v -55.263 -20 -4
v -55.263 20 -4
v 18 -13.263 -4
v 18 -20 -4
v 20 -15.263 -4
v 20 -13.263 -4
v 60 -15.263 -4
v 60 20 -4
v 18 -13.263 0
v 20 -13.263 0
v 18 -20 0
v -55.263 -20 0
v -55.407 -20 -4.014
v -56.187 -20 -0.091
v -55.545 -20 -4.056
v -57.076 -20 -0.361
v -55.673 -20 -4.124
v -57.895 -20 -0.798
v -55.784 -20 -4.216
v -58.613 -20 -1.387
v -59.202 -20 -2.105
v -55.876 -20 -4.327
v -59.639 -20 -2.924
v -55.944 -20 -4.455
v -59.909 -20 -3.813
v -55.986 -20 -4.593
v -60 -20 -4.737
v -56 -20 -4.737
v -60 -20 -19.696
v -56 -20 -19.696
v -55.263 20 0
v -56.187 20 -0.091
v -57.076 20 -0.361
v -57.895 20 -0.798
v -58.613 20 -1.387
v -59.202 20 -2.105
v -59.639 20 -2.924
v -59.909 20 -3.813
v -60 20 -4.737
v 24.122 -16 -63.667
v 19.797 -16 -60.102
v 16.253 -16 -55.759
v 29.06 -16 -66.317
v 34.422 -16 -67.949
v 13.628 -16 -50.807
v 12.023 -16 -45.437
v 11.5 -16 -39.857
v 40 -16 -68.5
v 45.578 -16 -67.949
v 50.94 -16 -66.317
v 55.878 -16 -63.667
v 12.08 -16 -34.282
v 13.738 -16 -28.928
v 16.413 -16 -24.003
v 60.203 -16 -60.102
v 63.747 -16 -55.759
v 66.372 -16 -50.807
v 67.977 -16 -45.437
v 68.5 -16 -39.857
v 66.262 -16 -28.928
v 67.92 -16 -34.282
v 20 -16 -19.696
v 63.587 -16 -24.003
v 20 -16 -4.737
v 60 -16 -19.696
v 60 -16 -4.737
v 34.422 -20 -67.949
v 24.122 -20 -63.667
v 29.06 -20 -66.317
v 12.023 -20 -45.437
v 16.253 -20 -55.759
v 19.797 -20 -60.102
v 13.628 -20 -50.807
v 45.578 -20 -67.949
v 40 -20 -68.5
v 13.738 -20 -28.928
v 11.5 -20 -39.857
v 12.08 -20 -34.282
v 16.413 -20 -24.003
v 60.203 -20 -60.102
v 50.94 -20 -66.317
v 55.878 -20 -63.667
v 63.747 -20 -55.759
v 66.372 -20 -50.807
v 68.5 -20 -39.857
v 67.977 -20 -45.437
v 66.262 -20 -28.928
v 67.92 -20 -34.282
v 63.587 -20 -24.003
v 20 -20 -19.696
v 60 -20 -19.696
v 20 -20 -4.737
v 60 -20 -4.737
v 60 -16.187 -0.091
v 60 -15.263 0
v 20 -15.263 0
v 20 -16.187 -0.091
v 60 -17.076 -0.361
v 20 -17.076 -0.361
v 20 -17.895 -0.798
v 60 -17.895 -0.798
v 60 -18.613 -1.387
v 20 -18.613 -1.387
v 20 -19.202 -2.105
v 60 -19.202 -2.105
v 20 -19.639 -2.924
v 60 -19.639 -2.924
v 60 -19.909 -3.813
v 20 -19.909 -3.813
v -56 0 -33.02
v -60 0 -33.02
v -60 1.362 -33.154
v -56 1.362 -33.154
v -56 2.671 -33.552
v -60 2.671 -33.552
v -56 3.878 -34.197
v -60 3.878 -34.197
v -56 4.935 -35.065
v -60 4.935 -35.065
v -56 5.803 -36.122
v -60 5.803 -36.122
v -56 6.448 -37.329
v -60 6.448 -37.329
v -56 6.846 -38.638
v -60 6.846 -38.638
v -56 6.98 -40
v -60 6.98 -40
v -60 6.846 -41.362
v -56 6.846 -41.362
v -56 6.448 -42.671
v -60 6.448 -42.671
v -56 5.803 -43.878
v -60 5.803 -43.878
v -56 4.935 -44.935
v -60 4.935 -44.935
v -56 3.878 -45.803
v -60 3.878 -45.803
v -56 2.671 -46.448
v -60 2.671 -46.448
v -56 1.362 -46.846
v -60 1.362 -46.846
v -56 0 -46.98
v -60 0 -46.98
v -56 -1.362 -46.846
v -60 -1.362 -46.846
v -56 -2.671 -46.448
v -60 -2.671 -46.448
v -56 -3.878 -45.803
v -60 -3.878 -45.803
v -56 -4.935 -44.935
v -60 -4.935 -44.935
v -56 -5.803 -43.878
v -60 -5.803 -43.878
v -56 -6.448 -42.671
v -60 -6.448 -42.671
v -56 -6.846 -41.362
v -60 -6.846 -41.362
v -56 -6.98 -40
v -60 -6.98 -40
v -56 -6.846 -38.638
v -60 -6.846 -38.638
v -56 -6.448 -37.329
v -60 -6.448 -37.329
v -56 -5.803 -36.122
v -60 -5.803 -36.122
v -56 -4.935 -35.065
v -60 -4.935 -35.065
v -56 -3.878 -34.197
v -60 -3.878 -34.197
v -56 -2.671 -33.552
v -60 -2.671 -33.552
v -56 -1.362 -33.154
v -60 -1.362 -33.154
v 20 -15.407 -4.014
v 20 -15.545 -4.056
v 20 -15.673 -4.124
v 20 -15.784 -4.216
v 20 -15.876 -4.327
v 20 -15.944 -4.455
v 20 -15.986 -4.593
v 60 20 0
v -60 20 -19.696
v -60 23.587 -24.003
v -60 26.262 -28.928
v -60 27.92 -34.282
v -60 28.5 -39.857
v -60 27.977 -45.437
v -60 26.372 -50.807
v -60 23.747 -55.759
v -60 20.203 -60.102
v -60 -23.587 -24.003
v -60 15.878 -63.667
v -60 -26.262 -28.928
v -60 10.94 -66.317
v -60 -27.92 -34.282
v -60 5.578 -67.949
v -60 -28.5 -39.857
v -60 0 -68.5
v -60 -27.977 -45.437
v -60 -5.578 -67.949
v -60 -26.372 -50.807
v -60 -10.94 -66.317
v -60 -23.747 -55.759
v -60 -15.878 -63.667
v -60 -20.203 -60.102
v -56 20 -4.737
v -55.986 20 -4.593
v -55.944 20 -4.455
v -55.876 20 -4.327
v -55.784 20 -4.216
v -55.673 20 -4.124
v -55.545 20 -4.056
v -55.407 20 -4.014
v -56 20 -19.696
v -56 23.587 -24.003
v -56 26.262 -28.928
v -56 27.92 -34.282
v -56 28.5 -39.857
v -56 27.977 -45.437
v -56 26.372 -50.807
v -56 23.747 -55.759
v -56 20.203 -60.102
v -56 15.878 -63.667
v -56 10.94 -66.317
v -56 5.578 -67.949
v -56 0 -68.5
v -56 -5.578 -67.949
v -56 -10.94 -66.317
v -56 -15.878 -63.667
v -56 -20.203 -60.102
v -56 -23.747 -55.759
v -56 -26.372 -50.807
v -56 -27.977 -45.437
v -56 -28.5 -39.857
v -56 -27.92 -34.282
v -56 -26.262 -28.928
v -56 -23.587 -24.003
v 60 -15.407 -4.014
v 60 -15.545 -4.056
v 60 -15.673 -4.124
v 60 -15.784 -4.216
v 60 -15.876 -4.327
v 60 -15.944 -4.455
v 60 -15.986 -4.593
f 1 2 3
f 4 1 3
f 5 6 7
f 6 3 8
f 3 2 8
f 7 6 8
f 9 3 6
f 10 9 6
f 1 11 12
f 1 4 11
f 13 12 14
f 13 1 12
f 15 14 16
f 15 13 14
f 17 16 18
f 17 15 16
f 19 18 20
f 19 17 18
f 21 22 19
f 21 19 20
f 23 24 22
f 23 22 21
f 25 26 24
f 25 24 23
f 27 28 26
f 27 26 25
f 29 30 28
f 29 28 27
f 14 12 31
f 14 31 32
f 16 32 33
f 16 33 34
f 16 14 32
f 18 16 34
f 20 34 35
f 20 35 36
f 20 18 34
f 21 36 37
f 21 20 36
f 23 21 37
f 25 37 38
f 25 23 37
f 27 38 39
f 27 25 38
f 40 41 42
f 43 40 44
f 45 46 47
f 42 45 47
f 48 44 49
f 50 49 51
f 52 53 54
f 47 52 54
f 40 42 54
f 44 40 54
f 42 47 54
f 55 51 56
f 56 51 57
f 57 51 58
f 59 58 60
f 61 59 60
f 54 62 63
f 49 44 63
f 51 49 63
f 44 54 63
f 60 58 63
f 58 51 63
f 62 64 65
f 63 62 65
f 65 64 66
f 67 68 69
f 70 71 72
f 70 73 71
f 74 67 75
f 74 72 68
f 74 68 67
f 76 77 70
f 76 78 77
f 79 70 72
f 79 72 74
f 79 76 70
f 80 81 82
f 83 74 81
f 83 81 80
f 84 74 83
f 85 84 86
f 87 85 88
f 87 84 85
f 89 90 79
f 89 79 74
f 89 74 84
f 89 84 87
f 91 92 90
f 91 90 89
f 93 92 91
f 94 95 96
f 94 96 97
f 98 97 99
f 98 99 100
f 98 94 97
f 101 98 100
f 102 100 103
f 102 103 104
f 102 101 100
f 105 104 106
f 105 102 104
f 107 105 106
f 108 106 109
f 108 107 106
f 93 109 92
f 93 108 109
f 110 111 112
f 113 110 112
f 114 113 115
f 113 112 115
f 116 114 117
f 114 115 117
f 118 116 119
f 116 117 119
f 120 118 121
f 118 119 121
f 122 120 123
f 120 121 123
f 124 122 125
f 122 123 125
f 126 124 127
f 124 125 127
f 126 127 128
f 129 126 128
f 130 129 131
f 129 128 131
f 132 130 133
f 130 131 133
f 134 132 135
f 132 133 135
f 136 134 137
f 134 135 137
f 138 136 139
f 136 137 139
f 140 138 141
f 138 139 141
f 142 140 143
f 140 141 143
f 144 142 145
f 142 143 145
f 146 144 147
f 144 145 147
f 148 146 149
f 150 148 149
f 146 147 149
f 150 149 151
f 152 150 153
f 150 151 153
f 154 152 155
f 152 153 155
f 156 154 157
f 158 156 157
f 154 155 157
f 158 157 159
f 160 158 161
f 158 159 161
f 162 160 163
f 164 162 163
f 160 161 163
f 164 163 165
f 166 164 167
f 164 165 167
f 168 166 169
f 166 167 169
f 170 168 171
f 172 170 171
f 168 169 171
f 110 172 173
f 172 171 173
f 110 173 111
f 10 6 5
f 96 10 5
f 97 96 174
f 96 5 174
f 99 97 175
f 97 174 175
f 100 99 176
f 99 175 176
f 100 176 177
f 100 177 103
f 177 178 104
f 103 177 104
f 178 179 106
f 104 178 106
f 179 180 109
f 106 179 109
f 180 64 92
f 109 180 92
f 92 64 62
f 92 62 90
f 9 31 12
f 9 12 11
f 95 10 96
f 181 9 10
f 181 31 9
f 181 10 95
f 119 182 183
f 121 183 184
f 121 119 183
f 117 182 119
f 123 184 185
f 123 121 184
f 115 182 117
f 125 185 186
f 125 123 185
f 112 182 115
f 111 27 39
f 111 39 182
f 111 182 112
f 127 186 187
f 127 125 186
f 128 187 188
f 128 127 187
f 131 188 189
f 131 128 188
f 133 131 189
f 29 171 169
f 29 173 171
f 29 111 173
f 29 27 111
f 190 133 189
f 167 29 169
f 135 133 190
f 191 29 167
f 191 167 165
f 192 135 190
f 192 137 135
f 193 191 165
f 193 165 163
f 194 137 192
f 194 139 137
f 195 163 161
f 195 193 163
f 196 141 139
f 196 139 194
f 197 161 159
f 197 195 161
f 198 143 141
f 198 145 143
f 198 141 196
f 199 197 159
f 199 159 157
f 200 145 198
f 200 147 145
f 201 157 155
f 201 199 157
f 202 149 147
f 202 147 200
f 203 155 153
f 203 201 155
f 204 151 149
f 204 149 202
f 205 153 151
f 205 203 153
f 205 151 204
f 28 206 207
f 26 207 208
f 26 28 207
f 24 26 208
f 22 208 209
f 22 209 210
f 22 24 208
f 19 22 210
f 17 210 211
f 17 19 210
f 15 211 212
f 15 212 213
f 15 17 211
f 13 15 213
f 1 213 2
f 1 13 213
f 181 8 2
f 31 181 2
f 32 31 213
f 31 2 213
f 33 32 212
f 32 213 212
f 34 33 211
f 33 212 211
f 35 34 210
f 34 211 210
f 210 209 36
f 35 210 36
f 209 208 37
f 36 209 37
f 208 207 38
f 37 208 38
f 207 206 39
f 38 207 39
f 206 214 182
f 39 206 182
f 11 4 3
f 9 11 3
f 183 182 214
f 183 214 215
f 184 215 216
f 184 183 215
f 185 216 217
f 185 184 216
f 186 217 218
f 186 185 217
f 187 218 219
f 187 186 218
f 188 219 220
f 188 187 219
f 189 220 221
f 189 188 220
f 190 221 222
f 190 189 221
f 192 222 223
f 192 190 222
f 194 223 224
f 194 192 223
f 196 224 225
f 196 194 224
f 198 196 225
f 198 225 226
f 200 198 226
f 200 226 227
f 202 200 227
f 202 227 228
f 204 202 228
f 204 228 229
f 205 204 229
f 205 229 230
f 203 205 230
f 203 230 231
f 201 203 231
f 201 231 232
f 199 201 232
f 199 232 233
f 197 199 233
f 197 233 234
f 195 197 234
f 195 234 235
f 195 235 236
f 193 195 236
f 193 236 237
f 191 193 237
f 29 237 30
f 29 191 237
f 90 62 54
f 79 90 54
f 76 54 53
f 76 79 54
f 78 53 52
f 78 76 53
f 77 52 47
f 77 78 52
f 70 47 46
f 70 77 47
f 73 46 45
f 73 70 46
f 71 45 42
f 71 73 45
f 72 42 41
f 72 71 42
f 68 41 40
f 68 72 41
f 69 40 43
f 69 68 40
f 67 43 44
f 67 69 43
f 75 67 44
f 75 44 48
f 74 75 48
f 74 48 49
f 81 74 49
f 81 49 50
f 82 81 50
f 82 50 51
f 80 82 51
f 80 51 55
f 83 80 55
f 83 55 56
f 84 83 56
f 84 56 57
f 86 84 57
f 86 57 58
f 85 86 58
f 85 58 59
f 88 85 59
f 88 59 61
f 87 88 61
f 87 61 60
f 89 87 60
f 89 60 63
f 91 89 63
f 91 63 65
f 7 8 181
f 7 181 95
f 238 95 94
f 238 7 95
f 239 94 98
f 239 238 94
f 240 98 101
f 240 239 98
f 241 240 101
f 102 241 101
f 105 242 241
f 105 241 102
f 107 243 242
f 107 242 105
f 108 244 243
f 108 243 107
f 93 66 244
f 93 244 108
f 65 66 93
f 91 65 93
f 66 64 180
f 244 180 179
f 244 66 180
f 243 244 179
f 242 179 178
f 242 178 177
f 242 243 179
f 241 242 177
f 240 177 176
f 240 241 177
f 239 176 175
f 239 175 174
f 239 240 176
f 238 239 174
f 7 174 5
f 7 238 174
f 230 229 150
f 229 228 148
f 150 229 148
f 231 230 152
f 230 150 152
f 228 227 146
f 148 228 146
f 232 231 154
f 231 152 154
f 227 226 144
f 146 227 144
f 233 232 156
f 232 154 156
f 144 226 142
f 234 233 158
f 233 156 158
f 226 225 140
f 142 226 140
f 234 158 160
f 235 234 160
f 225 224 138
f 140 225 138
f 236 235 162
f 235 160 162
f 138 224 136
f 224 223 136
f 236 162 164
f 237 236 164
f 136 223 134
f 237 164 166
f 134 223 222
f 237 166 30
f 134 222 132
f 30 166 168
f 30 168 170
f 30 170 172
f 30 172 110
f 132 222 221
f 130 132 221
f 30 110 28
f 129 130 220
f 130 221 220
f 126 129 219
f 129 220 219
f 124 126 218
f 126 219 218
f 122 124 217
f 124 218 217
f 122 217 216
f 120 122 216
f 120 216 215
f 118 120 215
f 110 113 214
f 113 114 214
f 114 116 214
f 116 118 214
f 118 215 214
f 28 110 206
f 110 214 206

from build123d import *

# Parameters (mm, degrees)
SKETCH_1_W                        = 120
SKETCH_1_H                        = 40
SM_BASE_FLANGE_1_DEPTH            = 4
SM_EDGE_FLANGE_1_STRIP_W          = 17.4732
SM_EDGE_FLANGE_1_STRIP_H          = 4
SM_EDGE_FLANGE_1_STRIP_CUT_DEPTH  = 40
SM_EDGE_FLANGE_1_DEPTH            = 40
SKETCH_12_R                       = 28.5
EXTRUDE_1_DEPTH                   = 4
SKETCH_13_R                       = 6.979767345
CUT_EXTRUDE_2_DEPTH               = 4
SM_EDGE_FLANGE_2_STRIP_W          = 17.4732
SM_EDGE_FLANGE_2_STRIP_H          = 4
SM_EDGE_FLANGE_2_STRIP_CUT_DEPTH  = 40
SM_EDGE_FLANGE_2_RELIEF_W         = 19.4732
SM_EDGE_FLANGE_2_RELIEF_H         = 2
SM_EDGE_FLANGE_2_RELIEF_CUT_DEPTH = 4
SM_EDGE_FLANGE_2_DEPTH            = 40
SKETCH_17_R                       = 28.5
EXTRUDE_2_DEPTH                   = 4


# Sheet-metal steps are written as plain solids
with BuildPart() as part:
    # Sketch 1 → 基体-法兰1 (new body)
    with BuildSketch(Plane.XY):
        Rectangle(SKETCH_1_W, SKETCH_1_H)
    extrude(amount=-SM_BASE_FLANGE_1_DEPTH)

    # 边线-法兰1 strip (across the edge) → 边线-法兰1 strip cut (cut)
    with BuildSketch(Plane(origin=(-60, -20, -4), x_dir=(1, 0, 0), z_dir=(0, 1, 0))):
        with Locations((-4, -2)):
            Rectangle(SM_EDGE_FLANGE_1_STRIP_W, SM_EDGE_FLANGE_1_STRIP_H)
    extrude(amount=SM_EDGE_FLANGE_1_STRIP_CUT_DEPTH, mode=Mode.SUBTRACT)

    # 边线-法兰1 section (across the edge) → 边线-法兰1 (add)
    with BuildSketch(Plane(origin=(-60, -20, -4), x_dir=(1, 0, 0), z_dir=(0, 1, 0))):
        with BuildLine():
            Line((0, 0.7366), (0, 32))
            Line((0, 32), (4, 32))
            Line((4, 32), (4, 0.7366))
            ThreePointArc((4, 0.7366), (4.215745145, 0.215745145), (4.7366, 0))
            Line((4.7366, 0), (4.7366, -4))
            ThreePointArc((4.7366, -4), (1.38731802, -2.61268198), (0, 0.7366))
        make_face()
    extrude(amount=SM_EDGE_FLANGE_1_DEPTH)

    # 草图12 → 凸台-拉伸1 (add)
    with BuildSketch(Plane.ZY.offset(60)):
        with Locations((-40, 0)):
            Circle(SKETCH_12_R)
    extrude(amount=-EXTRUDE_1_DEPTH)

    # 草图13 → 切除-拉伸2 (cut)
    with BuildSketch(Plane.ZY.offset(60)):
        with Locations((-40, 0)):
            Circle(SKETCH_13_R)
    extrude(amount=-CUT_EXTRUDE_2_DEPTH, mode=Mode.SUBTRACT)

    # 边线-法兰2 strip (across the edge) → 边线-法兰2 strip cut (cut)
    with BuildSketch(Plane(origin=(60, -20, -4), x_dir=(0, 1, 0), z_dir=(-1, 0, 0))):
        with Locations((-4, -2)):
            Rectangle(SM_EDGE_FLANGE_2_STRIP_W, SM_EDGE_FLANGE_2_STRIP_H)
    extrude(amount=SM_EDGE_FLANGE_2_STRIP_CUT_DEPTH, mode=Mode.SUBTRACT)

    # 边线-法兰2 relief (on the sheet) → 边线-法兰2 relief cut (cut)
    with BuildSketch(Plane(origin=(60, -15.2634, -4), x_dir=(0, 1, 0), z_dir=(0, 0, -1))):
        with Locations((-7.7366, -41)):
            Rectangle(SM_EDGE_FLANGE_2_RELIEF_W, SM_EDGE_FLANGE_2_RELIEF_H)
    extrude(amount=-SM_EDGE_FLANGE_2_RELIEF_CUT_DEPTH, mode=Mode.SUBTRACT)

    # 边线-法兰2 section (across the edge) → 边线-法兰2 (add)
    with BuildSketch(Plane(origin=(60, -20, -4), x_dir=(0, 1, 0), z_dir=(-1, 0, 0))):
        with BuildLine():
            Line((0, 0.7366), (0, 30))
            Line((0, 30), (4, 30))
            Line((4, 30), (4, 0.7366))
            ThreePointArc((4, 0.7366), (4.215745145, 0.215745145), (4.7366, 0))
            Line((4.7366, 0), (4.7366, -4))
            ThreePointArc((4.7366, -4), (1.38731802, -2.61268198), (0, 0.7366))
        make_face()
    extrude(amount=SM_EDGE_FLANGE_2_DEPTH)

    # 草图17 → 凸台-拉伸2 (add)
    with BuildSketch(Plane.XZ.offset(20)):
        with Locations((40, -40)):
            Circle(SKETCH_17_R)
    extrude(amount=-EXTRUDE_2_DEPTH)


solid = part.part
